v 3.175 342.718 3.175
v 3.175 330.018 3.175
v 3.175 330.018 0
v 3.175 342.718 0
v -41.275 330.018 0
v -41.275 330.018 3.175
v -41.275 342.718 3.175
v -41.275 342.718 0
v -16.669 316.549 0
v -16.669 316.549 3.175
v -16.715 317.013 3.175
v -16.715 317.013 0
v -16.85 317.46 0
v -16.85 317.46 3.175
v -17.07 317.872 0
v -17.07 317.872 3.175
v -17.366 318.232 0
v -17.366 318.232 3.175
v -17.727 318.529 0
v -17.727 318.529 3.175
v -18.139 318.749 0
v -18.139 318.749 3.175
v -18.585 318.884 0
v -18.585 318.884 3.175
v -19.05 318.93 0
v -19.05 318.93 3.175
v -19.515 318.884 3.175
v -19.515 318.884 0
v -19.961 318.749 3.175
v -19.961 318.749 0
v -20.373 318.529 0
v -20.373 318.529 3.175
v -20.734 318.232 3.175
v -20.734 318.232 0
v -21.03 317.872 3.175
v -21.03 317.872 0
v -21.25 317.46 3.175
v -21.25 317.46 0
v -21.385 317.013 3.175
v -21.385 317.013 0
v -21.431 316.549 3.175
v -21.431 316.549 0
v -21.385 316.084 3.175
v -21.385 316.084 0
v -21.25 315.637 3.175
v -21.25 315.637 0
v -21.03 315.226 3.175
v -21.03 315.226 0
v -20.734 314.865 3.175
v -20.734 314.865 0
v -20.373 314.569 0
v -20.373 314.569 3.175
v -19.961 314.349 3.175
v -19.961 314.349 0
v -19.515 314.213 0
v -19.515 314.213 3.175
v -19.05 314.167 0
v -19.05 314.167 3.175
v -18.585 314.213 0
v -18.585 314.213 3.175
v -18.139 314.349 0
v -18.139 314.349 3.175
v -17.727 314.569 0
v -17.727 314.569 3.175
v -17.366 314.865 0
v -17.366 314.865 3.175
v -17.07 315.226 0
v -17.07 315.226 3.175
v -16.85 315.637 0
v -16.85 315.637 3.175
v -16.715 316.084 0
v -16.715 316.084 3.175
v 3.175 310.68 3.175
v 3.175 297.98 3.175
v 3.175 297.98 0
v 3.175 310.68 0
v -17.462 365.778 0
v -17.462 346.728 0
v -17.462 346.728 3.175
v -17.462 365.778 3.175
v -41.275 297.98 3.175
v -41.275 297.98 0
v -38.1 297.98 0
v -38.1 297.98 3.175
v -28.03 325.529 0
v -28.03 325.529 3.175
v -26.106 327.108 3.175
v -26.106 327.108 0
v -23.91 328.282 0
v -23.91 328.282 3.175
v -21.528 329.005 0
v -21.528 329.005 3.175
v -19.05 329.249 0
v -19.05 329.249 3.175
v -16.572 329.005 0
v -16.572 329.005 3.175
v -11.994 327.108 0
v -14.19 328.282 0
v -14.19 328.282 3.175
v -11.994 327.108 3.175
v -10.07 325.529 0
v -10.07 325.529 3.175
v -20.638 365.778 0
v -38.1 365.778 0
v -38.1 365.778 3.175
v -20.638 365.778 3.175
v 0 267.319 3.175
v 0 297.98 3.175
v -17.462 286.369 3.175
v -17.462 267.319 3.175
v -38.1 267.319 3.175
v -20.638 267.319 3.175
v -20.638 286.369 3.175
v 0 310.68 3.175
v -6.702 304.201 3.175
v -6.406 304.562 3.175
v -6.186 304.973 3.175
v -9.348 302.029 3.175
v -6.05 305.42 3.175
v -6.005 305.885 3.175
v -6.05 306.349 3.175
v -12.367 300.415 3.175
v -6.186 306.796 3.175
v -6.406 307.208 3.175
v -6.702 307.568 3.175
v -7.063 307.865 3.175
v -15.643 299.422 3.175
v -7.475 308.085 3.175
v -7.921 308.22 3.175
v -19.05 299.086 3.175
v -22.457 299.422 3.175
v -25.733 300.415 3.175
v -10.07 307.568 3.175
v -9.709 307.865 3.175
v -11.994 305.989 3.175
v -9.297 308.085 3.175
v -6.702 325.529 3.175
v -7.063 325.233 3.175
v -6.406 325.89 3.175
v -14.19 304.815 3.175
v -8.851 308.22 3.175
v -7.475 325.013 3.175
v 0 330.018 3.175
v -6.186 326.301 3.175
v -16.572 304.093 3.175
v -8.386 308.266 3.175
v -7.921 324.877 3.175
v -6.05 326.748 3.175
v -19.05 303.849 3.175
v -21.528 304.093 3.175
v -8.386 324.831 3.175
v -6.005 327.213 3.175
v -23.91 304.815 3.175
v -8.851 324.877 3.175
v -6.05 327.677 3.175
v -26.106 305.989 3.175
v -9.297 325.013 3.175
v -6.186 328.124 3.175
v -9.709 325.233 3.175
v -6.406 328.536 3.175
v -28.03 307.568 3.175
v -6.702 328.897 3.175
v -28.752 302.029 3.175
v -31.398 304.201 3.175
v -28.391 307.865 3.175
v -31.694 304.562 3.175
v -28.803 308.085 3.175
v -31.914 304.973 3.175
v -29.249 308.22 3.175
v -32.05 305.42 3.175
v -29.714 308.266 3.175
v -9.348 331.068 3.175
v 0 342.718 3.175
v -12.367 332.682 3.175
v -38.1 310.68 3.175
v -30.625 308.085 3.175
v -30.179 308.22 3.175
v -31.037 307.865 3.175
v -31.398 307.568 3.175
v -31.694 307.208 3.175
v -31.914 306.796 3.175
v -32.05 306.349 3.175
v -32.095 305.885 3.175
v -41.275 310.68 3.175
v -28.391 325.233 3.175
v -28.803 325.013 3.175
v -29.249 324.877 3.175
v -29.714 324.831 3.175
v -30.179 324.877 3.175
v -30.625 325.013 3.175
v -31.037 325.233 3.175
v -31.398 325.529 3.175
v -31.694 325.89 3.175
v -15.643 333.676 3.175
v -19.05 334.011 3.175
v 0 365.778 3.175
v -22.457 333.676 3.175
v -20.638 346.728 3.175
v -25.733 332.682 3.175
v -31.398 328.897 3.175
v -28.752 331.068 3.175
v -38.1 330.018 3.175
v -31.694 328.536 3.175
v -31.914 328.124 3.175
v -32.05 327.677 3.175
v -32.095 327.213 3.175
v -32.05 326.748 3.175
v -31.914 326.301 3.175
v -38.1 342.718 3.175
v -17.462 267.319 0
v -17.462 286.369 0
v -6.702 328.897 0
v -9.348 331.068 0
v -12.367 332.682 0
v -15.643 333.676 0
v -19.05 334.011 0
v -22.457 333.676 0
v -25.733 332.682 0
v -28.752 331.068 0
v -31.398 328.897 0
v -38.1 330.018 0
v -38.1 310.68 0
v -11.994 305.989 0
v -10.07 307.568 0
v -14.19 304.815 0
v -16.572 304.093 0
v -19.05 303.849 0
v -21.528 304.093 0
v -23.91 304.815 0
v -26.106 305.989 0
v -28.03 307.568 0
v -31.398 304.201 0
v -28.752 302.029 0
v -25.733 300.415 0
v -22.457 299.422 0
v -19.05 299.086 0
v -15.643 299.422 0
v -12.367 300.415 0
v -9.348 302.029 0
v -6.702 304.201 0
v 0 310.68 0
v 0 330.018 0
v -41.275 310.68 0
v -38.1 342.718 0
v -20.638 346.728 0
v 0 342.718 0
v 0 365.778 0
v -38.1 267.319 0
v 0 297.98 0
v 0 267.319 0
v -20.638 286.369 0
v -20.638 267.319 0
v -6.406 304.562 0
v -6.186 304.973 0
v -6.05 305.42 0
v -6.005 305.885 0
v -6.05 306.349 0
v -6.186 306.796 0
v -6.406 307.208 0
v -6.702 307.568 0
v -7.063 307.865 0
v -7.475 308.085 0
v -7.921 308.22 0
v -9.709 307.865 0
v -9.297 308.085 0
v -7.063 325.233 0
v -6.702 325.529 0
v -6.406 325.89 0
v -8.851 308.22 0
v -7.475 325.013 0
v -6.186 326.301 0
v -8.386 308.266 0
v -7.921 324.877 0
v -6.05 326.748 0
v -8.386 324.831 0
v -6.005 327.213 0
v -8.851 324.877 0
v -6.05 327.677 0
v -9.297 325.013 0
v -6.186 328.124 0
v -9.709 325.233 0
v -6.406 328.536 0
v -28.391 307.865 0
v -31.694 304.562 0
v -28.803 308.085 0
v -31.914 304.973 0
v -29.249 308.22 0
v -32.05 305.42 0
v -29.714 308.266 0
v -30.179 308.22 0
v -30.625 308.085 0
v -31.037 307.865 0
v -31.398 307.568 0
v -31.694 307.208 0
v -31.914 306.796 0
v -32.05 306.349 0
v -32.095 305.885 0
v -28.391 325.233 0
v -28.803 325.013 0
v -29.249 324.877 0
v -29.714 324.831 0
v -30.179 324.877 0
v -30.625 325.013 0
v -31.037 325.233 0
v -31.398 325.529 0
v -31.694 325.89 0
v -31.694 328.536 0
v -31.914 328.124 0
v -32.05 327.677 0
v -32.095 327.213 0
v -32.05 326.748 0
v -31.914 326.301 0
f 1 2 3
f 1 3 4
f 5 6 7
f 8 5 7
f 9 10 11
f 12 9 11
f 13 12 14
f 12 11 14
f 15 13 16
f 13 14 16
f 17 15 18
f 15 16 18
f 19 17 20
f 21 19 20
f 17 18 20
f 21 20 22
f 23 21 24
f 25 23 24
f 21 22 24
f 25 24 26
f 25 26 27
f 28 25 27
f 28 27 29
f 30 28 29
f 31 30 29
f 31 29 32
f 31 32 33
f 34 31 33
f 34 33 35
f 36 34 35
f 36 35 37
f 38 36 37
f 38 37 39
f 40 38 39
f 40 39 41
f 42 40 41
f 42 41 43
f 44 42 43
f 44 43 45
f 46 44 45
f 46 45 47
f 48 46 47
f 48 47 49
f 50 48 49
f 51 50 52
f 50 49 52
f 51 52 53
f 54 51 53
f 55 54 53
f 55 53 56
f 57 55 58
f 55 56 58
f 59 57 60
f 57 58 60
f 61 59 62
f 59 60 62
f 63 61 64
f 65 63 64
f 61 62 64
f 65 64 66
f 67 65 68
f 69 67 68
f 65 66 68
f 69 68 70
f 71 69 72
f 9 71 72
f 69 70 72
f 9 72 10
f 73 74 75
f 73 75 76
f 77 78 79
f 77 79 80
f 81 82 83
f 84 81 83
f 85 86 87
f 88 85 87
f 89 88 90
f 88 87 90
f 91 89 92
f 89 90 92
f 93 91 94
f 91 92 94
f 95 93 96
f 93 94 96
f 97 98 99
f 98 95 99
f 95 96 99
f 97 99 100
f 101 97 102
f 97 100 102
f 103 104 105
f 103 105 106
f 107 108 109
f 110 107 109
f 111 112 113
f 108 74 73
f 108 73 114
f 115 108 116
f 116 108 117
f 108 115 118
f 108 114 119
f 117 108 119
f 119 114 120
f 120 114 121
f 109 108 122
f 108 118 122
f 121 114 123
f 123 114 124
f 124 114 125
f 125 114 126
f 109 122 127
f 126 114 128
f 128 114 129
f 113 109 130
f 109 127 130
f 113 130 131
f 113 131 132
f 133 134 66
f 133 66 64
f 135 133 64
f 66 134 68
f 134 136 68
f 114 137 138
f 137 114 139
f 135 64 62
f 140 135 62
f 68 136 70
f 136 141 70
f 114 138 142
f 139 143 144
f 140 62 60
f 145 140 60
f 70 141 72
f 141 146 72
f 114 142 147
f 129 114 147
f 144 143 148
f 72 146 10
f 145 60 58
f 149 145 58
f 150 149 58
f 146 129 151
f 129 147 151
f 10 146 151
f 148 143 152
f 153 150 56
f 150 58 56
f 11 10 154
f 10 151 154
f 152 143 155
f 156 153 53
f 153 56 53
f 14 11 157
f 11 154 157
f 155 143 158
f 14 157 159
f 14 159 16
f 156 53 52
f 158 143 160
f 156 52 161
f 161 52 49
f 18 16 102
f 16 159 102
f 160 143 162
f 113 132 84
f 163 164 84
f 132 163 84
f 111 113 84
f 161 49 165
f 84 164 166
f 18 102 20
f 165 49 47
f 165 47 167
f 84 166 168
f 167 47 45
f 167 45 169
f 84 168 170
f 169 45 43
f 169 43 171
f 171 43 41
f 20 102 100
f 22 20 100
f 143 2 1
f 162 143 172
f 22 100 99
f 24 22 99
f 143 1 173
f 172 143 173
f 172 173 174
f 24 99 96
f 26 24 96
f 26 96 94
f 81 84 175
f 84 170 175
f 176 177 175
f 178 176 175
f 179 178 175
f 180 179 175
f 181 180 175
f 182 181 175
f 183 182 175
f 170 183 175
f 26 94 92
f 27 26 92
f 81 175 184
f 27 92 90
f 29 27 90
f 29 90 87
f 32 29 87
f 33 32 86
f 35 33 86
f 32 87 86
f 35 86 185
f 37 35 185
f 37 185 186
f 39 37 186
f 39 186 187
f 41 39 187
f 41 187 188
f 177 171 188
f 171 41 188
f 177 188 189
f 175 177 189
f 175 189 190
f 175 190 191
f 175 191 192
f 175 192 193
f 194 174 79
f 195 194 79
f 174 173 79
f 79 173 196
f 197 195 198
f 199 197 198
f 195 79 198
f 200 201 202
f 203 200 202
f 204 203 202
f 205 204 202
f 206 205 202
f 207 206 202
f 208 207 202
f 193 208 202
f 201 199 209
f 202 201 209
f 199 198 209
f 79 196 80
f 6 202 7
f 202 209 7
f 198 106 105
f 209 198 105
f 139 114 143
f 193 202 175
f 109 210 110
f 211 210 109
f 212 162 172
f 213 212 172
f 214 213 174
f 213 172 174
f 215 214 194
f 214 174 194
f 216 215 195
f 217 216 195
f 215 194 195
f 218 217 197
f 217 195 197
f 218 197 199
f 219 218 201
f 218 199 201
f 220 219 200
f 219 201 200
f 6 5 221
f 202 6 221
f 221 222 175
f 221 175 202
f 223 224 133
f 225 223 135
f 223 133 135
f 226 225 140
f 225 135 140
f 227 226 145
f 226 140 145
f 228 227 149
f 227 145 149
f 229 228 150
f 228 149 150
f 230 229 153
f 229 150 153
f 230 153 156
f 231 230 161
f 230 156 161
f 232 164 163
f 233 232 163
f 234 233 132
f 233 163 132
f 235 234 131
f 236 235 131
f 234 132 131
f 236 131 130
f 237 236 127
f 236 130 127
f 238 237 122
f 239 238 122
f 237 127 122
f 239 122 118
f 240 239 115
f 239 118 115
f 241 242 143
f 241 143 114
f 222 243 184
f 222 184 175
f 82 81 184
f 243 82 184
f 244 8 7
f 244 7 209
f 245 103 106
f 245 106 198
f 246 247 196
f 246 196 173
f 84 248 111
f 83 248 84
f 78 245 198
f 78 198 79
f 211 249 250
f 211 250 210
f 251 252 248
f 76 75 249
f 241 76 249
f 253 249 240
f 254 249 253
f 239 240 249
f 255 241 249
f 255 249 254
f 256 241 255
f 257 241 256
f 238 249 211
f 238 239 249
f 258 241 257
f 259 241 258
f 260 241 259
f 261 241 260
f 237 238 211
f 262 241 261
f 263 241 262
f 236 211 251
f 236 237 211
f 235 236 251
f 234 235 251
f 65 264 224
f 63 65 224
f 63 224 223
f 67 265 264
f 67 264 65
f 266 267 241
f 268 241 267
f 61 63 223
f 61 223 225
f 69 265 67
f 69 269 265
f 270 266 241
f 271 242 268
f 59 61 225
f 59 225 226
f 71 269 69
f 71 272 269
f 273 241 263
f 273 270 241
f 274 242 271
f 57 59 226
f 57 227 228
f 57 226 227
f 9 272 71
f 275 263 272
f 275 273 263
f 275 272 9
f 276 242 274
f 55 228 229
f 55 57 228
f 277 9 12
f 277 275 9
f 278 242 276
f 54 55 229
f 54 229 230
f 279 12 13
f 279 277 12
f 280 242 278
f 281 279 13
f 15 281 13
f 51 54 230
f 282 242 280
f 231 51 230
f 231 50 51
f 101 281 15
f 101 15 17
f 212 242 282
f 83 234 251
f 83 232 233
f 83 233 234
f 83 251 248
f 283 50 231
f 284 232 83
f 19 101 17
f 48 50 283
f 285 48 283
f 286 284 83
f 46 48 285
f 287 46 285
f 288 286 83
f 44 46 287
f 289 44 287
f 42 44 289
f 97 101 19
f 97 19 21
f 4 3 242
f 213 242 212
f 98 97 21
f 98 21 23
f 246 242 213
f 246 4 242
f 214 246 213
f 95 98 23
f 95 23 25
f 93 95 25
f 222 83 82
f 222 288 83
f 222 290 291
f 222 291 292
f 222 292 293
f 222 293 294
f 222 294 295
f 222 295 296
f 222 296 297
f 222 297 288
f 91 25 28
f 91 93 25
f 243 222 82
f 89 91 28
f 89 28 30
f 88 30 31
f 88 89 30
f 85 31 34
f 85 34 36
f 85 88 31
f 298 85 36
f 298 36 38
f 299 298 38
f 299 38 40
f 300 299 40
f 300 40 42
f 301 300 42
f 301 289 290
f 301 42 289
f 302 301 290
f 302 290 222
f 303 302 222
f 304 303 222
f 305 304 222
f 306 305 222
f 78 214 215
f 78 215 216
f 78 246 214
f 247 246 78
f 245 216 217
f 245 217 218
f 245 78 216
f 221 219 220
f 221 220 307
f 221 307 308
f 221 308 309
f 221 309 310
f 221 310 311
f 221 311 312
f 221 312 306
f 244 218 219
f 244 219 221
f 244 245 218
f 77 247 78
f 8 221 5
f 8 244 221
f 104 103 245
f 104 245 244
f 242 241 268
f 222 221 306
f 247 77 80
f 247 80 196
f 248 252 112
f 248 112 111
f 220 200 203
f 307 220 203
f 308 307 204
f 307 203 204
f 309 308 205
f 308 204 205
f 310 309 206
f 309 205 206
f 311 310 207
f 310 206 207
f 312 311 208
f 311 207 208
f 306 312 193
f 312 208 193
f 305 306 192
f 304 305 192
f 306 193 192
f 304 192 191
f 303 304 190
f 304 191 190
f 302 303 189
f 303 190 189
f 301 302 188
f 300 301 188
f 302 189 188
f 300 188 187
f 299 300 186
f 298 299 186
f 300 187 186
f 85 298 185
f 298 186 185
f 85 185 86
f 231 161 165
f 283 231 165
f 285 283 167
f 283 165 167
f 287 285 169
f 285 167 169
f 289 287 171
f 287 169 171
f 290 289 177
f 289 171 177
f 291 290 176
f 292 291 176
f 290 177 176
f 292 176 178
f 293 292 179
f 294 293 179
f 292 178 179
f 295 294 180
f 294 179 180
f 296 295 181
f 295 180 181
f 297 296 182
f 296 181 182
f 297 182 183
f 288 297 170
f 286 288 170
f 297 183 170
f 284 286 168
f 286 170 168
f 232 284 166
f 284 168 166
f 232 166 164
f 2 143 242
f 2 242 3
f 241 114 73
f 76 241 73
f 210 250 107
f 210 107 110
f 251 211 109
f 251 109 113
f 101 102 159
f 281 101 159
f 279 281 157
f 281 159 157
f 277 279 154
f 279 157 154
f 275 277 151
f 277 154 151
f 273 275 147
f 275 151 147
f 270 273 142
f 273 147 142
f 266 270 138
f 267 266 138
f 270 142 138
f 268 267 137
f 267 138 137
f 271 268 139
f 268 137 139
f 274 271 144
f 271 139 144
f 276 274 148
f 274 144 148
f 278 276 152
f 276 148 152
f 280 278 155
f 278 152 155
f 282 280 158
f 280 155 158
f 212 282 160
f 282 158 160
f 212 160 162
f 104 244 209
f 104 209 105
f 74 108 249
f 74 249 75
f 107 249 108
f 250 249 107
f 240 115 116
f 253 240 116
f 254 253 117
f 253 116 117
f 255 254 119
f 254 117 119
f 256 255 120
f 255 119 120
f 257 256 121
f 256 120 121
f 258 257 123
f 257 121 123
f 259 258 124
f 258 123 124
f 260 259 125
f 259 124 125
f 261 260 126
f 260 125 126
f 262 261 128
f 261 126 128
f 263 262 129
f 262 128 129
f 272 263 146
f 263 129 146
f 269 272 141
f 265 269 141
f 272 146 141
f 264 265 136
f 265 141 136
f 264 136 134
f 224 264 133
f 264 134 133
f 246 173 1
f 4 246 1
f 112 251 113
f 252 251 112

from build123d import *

# Parameters (mm, degrees)
BOSS_EXTRUDE1_DEPTH = 3.175
SKETCH3_R           = 2.38125
CUT_EXTRUDE1_DEPTH  = 5.08
SKETCH5_W           = 3.175
SKETCH5_H           = 12.7
BOSS_EXTRUDE2_DEPTH = 3.175


with BuildPart() as part:
    # Sketch1 → Boss-Extrude1 (new body)
    with BuildSketch(Plane.XY):
        Polygon((-38.1, 365.778475051), (-20.6375, 365.778475051), (-20.6375, 346.728475051), (-17.4625, 346.728475051), (-17.4625, 365.778475051), (0, 365.778475051), (0, 267.318840011), (-17.4625, 267.318840011), (-17.4625, 286.368840011), (-20.6375, 286.368840011), (-20.6375, 267.318840011), (-38.1, 267.318840011), align=None)
    extrude(amount=BOSS_EXTRUDE1_DEPTH)

    # Sketch3 → Cut-Extrude1 (cut)
    with BuildSketch(Plane.XY.offset(3.175)):
        with Locations((-19.05, 316.548657531)):
            Circle(SKETCH3_R)
        with BuildLine():
            ThreePointArc((-31.397852166, 304.200805365), (-19.05, 299.086157531), (-6.702147834, 304.200805365))
            ThreePointArc((-6.702147834, 304.200805365), (-6.702147834, 307.56840141), (-10.069743879, 307.56840141))
            ThreePointArc((-10.069743879, 307.56840141), (-19.05, 303.848657531), (-28.030256121, 307.56840141))
            ThreePointArc((-28.030256121, 307.56840141), (-31.397852166, 307.56840141), (-31.397852166, 304.200805365))
        make_face()
        with BuildLine():
            ThreePointArc((-6.702147834, 328.896509698), (-19.05, 334.011157531), (-31.397852166, 328.896509698))
            ThreePointArc((-31.397852166, 328.896509698), (-31.397852166, 325.528913652), (-28.030256121, 325.528913652))
            ThreePointArc((-28.030256121, 325.528913652), (-19.05, 329.248657531), (-10.069743879, 325.528913652))
            ThreePointArc((-10.069743879, 325.528913652), (-6.702147834, 325.528913652), (-6.702147834, 328.896509698))
        make_face()
    extrude(amount=-CUT_EXTRUDE1_DEPTH, mode=Mode.SUBTRACT)

    # Sketch5 → Boss-Extrude2 (add)
    with BuildSketch(Plane.XY.offset(3.175)):
        with Locations((1.5875, 336.36769286)):
            Rectangle(SKETCH5_W, SKETCH5_H)
        with Locations((1.5875, 304.329924583)):
            Rectangle(SKETCH5_W, SKETCH5_H)
        with Locations((-39.6875, 304.329924583)):
            Rectangle(SKETCH5_W, SKETCH5_H)
        with Locations((-39.6875, 336.36769286)):
            Rectangle(SKETCH5_W, SKETCH5_H)
    extrude(amount=-BOSS_EXTRUDE2_DEPTH)


solid = part.part
